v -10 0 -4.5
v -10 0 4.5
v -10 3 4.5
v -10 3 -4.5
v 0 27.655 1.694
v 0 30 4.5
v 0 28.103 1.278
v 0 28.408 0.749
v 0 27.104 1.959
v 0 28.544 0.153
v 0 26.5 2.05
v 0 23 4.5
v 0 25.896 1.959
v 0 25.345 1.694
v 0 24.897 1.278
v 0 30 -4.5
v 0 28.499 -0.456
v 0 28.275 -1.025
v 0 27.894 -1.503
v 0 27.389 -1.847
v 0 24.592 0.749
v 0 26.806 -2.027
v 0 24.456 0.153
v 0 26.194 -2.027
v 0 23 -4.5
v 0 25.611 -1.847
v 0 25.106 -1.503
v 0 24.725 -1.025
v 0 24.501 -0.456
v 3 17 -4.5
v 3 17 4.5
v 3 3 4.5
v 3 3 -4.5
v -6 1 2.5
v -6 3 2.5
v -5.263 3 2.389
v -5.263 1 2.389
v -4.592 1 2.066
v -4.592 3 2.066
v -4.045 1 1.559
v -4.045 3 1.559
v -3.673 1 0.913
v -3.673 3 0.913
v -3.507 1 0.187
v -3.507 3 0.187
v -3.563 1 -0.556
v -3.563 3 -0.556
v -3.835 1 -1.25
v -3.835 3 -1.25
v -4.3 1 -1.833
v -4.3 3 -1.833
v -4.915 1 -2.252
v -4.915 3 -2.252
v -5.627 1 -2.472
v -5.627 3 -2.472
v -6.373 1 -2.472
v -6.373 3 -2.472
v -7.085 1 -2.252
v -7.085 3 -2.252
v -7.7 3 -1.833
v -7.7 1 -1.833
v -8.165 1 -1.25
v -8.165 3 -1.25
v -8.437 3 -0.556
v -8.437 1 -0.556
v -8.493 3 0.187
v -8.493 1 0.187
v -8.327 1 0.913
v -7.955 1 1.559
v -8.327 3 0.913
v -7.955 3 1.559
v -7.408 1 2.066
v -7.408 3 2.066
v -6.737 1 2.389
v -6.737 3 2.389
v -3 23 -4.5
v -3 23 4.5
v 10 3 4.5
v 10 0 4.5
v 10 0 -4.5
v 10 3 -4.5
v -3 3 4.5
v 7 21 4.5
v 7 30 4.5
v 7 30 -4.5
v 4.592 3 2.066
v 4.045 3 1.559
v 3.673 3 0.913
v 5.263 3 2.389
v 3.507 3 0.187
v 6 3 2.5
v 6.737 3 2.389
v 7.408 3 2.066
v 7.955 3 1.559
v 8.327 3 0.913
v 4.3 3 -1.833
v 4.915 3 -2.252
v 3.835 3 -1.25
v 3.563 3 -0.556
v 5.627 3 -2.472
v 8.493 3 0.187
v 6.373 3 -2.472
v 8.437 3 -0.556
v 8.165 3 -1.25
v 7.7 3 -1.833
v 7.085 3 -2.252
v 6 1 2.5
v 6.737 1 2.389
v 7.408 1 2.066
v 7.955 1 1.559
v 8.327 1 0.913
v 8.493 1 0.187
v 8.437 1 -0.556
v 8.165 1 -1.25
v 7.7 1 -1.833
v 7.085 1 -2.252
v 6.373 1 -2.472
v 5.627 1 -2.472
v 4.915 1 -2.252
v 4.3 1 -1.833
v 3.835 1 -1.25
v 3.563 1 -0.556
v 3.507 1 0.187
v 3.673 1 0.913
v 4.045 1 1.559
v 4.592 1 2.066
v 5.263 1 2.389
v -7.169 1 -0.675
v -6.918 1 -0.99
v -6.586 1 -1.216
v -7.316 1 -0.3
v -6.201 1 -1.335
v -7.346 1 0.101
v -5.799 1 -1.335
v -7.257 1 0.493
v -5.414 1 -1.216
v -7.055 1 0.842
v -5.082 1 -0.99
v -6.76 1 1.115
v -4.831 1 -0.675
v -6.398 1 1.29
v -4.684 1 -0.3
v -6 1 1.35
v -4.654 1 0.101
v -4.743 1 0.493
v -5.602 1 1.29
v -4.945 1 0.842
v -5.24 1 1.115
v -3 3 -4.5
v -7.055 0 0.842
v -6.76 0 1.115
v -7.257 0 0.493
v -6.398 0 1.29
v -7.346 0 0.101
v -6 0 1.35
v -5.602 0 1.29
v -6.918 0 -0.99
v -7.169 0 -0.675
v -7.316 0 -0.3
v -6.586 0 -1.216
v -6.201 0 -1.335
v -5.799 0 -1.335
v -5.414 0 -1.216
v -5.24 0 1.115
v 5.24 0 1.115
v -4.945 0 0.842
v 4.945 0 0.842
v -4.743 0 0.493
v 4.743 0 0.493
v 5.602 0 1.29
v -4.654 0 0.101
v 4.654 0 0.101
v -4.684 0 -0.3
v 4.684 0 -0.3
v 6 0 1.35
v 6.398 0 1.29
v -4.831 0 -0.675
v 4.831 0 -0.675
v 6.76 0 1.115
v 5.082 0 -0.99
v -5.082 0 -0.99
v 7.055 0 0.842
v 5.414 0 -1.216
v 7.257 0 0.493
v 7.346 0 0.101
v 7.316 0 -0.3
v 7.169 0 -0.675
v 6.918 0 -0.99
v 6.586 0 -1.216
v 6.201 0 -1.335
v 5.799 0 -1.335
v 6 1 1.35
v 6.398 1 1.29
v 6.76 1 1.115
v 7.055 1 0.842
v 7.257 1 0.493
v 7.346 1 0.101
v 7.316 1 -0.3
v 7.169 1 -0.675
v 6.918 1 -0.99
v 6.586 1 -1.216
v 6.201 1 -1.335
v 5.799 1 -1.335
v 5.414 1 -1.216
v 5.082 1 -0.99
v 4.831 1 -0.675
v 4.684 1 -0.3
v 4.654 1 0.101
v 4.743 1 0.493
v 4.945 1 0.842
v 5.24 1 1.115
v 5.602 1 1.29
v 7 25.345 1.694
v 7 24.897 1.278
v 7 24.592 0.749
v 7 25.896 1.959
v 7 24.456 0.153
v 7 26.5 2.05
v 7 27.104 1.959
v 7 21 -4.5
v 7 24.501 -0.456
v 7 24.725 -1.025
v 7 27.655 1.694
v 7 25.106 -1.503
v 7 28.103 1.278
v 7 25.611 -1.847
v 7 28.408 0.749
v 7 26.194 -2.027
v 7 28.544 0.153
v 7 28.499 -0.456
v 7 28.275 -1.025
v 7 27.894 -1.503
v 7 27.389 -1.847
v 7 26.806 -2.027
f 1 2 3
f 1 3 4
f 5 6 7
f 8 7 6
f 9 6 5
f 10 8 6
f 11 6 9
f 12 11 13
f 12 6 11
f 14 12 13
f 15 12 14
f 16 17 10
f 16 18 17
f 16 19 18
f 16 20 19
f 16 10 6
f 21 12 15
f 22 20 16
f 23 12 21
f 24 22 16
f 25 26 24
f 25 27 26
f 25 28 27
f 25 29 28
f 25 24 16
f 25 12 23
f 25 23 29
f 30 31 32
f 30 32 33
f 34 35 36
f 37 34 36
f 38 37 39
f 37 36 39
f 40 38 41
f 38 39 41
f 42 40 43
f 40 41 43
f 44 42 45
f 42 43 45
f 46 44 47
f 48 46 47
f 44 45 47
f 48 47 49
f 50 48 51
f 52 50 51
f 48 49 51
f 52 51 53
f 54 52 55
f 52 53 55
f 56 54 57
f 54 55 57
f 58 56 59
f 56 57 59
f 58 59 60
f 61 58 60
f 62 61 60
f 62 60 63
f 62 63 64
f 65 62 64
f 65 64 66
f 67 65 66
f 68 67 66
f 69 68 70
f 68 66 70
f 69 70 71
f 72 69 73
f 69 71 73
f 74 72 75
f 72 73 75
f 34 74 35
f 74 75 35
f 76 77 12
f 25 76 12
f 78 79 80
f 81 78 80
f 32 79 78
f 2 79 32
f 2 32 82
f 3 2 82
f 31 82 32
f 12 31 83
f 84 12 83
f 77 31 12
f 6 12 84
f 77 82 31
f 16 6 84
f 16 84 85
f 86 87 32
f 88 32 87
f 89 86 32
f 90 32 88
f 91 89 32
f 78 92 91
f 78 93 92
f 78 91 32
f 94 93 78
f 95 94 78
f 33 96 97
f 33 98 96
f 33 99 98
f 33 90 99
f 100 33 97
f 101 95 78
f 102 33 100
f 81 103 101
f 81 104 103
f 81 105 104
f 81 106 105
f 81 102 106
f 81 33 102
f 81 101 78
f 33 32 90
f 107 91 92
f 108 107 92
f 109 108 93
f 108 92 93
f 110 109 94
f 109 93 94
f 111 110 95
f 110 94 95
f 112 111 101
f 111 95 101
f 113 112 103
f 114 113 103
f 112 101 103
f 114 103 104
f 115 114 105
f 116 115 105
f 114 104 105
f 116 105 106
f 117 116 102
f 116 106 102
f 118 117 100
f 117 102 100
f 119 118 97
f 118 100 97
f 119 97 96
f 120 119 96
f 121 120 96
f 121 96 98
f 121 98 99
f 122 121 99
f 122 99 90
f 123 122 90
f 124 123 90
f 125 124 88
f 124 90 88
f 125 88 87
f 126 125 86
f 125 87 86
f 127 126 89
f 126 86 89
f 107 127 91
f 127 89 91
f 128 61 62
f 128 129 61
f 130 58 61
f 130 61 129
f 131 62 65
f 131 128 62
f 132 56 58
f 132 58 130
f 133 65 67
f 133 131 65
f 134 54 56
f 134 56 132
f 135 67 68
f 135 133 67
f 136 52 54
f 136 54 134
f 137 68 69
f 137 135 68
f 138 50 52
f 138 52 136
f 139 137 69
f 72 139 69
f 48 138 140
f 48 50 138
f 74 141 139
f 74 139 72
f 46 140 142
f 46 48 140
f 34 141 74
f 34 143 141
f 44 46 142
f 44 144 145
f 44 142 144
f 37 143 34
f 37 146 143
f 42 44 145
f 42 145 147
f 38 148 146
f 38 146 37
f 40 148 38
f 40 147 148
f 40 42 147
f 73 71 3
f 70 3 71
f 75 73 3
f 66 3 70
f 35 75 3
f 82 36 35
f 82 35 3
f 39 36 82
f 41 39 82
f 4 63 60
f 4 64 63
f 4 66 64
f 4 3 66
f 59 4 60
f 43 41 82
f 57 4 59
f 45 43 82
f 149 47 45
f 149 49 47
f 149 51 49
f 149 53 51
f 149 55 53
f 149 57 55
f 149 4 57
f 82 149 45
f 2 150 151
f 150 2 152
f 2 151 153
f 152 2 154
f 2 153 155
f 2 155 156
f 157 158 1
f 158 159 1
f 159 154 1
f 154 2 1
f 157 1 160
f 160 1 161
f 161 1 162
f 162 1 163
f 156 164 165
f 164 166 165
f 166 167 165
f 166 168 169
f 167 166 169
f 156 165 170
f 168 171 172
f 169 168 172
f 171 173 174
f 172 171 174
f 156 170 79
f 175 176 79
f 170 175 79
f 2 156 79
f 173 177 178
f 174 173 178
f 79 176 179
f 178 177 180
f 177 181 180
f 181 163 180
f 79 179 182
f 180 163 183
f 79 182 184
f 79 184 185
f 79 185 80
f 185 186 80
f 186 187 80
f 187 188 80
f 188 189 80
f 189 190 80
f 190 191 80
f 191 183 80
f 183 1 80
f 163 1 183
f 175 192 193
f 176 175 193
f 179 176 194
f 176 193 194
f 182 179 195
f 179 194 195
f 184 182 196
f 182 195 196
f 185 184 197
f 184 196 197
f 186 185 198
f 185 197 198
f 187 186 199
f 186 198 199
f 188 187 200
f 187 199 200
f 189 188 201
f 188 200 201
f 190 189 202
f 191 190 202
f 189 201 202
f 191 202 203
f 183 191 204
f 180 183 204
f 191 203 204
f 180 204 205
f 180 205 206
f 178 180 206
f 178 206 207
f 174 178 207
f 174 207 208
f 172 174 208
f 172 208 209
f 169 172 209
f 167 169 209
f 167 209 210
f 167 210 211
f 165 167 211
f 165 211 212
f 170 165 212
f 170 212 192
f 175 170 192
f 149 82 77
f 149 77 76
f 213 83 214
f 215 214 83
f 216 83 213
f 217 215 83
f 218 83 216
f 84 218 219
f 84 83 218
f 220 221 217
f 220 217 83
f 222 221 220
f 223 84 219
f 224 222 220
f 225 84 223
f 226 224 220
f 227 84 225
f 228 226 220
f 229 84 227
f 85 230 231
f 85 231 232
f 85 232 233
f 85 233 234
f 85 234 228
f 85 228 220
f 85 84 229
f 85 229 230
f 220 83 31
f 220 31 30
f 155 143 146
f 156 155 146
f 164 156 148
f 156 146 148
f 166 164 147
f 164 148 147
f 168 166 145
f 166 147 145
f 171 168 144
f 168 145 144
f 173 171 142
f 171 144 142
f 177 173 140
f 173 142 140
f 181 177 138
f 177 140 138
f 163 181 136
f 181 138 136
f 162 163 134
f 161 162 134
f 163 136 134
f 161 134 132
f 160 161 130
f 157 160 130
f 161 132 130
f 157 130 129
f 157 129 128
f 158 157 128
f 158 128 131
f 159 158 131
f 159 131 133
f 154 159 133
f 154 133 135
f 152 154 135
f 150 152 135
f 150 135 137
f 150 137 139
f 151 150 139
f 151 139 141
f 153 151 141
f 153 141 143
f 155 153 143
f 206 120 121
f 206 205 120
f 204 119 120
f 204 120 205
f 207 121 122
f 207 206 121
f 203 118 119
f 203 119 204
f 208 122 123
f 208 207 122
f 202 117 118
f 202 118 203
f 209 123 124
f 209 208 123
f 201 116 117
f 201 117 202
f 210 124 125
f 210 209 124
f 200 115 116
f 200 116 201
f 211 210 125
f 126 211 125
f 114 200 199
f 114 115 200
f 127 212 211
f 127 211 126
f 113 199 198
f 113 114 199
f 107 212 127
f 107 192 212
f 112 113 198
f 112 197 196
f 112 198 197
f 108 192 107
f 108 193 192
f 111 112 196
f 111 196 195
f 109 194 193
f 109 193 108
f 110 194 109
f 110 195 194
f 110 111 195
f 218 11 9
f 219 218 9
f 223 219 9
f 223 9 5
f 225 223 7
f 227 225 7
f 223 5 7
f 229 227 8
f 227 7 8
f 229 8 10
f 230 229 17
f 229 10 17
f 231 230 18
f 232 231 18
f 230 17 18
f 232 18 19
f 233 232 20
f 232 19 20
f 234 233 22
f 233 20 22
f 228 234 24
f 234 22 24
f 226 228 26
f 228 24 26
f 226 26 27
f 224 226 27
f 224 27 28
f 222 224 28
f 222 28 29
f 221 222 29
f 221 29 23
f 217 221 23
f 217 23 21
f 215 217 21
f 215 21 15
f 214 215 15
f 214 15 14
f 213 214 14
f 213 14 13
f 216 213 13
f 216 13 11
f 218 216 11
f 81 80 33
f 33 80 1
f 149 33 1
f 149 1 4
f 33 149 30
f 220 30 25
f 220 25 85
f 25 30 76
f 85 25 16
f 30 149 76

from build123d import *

# Parameters (mm, degrees)
SKETCH1_W           = 20
SKETCH1_H           = 9
BOSS_EXTRUDE1_DEPTH = 3
SKETCH2_R           = 1.35
CUT_EXTRUDE1_DEPTH  = 12.368817001
SKETCH3_R           = 2.5
CUT_EXTRUDE2_DEPTH  = 2
SKETCH4_W           = 6
SKETCH4_H           = 9
BOSS_EXTRUDE2_DEPTH = 20
SKETCH7_W           = 3
SKETCH7_H           = 9
BOSS_EXTRUDE5_DEPTH = 7
SKETCH8_W           = 9
SKETCH8_H           = 9
BOSS_EXTRUDE6_DEPTH = 4
CHAMFER1_SIZE       = 4
SKETCH9_R           = 2.05
CUT_EXTRUDE3_DEPTH  = 32.941352507


with BuildPart() as part:
    # Sketch1 → Boss-Extrude1 (new body)
    with BuildSketch(Plane(origin=(0, 0, 0), x_dir=(1, 0, 0), z_dir=(0, 1, 0))):
        Rectangle(SKETCH1_W, SKETCH1_H)
    extrude(amount=BOSS_EXTRUDE1_DEPTH)

    # Sketch2 → Cut-Extrude1 (cut, through all)
    with BuildSketch(Plane(origin=(0, 3, 0), x_dir=(1, 0, 0), z_dir=(0, 1, 0))):
        with Locations(Location((-6, 0, 0), (0, 0, 270))):
            Circle(SKETCH2_R)
        with Locations(Location((6, 0, 0), (0, 0, 270))):
            Circle(SKETCH2_R)
    extrude(amount=-CUT_EXTRUDE1_DEPTH, mode=Mode.SUBTRACT)

    # Sketch3 → Cut-Extrude2 (cut)
    with BuildSketch(Plane(origin=(0, 3, 0), x_dir=(1, 0, 0), z_dir=(0, 1, 0))):
        with Locations(Location((-6, 0, 0), (0, 0, 270))):
            Circle(SKETCH3_R)
        with Locations(Location((6, 0, 0), (0, 0, 270))):
            Circle(SKETCH3_R)
    extrude(amount=-CUT_EXTRUDE2_DEPTH, mode=Mode.SUBTRACT)

    # Sketch4 → Boss-Extrude2 (add)
    with BuildSketch(Plane(origin=(0, 3, 0), x_dir=(1, 0, 0), z_dir=(0, 1, 0))):
        Rectangle(SKETCH4_W, SKETCH4_H)
    extrude(amount=BOSS_EXTRUDE2_DEPTH)

    # Sketch7 → Boss-Extrude5 (add)
    with BuildSketch(Plane(origin=(0, 23, 0), x_dir=(1, 0, 0), z_dir=(0, 1, 0))):
        with Locations((1.5, 0)):
            Rectangle(SKETCH7_W, SKETCH7_H)
    extrude(amount=BOSS_EXTRUDE5_DEPTH)

    # Sketch8 → Boss-Extrude6 (add)
    with BuildSketch(Plane(origin=(3, 0, 0), x_dir=(0, 0, -1), z_dir=(1, 0, 0))):
        with Locations((0, 25.5)):
            Rectangle(SKETCH8_W, SKETCH8_H)
    extrude(amount=BOSS_EXTRUDE6_DEPTH)

    # Chamfer1
    chamfer1_edges = [part.edges().sort_by_distance(p)[0] for p in [
        (3, 21, 0),
    ]]
    chamfer(chamfer1_edges, length=CHAMFER1_SIZE - 0.0001)  # a hair under: the kernel refuses the full size

    # Sketch9 → Cut-Extrude3 (cut, through all)
    with BuildSketch(Plane.ZY):
        with Locations((0, 26.5)):
            Circle(SKETCH9_R)
    extrude(amount=-CUT_EXTRUDE3_DEPTH, mode=Mode.SUBTRACT)


solid = part.part
